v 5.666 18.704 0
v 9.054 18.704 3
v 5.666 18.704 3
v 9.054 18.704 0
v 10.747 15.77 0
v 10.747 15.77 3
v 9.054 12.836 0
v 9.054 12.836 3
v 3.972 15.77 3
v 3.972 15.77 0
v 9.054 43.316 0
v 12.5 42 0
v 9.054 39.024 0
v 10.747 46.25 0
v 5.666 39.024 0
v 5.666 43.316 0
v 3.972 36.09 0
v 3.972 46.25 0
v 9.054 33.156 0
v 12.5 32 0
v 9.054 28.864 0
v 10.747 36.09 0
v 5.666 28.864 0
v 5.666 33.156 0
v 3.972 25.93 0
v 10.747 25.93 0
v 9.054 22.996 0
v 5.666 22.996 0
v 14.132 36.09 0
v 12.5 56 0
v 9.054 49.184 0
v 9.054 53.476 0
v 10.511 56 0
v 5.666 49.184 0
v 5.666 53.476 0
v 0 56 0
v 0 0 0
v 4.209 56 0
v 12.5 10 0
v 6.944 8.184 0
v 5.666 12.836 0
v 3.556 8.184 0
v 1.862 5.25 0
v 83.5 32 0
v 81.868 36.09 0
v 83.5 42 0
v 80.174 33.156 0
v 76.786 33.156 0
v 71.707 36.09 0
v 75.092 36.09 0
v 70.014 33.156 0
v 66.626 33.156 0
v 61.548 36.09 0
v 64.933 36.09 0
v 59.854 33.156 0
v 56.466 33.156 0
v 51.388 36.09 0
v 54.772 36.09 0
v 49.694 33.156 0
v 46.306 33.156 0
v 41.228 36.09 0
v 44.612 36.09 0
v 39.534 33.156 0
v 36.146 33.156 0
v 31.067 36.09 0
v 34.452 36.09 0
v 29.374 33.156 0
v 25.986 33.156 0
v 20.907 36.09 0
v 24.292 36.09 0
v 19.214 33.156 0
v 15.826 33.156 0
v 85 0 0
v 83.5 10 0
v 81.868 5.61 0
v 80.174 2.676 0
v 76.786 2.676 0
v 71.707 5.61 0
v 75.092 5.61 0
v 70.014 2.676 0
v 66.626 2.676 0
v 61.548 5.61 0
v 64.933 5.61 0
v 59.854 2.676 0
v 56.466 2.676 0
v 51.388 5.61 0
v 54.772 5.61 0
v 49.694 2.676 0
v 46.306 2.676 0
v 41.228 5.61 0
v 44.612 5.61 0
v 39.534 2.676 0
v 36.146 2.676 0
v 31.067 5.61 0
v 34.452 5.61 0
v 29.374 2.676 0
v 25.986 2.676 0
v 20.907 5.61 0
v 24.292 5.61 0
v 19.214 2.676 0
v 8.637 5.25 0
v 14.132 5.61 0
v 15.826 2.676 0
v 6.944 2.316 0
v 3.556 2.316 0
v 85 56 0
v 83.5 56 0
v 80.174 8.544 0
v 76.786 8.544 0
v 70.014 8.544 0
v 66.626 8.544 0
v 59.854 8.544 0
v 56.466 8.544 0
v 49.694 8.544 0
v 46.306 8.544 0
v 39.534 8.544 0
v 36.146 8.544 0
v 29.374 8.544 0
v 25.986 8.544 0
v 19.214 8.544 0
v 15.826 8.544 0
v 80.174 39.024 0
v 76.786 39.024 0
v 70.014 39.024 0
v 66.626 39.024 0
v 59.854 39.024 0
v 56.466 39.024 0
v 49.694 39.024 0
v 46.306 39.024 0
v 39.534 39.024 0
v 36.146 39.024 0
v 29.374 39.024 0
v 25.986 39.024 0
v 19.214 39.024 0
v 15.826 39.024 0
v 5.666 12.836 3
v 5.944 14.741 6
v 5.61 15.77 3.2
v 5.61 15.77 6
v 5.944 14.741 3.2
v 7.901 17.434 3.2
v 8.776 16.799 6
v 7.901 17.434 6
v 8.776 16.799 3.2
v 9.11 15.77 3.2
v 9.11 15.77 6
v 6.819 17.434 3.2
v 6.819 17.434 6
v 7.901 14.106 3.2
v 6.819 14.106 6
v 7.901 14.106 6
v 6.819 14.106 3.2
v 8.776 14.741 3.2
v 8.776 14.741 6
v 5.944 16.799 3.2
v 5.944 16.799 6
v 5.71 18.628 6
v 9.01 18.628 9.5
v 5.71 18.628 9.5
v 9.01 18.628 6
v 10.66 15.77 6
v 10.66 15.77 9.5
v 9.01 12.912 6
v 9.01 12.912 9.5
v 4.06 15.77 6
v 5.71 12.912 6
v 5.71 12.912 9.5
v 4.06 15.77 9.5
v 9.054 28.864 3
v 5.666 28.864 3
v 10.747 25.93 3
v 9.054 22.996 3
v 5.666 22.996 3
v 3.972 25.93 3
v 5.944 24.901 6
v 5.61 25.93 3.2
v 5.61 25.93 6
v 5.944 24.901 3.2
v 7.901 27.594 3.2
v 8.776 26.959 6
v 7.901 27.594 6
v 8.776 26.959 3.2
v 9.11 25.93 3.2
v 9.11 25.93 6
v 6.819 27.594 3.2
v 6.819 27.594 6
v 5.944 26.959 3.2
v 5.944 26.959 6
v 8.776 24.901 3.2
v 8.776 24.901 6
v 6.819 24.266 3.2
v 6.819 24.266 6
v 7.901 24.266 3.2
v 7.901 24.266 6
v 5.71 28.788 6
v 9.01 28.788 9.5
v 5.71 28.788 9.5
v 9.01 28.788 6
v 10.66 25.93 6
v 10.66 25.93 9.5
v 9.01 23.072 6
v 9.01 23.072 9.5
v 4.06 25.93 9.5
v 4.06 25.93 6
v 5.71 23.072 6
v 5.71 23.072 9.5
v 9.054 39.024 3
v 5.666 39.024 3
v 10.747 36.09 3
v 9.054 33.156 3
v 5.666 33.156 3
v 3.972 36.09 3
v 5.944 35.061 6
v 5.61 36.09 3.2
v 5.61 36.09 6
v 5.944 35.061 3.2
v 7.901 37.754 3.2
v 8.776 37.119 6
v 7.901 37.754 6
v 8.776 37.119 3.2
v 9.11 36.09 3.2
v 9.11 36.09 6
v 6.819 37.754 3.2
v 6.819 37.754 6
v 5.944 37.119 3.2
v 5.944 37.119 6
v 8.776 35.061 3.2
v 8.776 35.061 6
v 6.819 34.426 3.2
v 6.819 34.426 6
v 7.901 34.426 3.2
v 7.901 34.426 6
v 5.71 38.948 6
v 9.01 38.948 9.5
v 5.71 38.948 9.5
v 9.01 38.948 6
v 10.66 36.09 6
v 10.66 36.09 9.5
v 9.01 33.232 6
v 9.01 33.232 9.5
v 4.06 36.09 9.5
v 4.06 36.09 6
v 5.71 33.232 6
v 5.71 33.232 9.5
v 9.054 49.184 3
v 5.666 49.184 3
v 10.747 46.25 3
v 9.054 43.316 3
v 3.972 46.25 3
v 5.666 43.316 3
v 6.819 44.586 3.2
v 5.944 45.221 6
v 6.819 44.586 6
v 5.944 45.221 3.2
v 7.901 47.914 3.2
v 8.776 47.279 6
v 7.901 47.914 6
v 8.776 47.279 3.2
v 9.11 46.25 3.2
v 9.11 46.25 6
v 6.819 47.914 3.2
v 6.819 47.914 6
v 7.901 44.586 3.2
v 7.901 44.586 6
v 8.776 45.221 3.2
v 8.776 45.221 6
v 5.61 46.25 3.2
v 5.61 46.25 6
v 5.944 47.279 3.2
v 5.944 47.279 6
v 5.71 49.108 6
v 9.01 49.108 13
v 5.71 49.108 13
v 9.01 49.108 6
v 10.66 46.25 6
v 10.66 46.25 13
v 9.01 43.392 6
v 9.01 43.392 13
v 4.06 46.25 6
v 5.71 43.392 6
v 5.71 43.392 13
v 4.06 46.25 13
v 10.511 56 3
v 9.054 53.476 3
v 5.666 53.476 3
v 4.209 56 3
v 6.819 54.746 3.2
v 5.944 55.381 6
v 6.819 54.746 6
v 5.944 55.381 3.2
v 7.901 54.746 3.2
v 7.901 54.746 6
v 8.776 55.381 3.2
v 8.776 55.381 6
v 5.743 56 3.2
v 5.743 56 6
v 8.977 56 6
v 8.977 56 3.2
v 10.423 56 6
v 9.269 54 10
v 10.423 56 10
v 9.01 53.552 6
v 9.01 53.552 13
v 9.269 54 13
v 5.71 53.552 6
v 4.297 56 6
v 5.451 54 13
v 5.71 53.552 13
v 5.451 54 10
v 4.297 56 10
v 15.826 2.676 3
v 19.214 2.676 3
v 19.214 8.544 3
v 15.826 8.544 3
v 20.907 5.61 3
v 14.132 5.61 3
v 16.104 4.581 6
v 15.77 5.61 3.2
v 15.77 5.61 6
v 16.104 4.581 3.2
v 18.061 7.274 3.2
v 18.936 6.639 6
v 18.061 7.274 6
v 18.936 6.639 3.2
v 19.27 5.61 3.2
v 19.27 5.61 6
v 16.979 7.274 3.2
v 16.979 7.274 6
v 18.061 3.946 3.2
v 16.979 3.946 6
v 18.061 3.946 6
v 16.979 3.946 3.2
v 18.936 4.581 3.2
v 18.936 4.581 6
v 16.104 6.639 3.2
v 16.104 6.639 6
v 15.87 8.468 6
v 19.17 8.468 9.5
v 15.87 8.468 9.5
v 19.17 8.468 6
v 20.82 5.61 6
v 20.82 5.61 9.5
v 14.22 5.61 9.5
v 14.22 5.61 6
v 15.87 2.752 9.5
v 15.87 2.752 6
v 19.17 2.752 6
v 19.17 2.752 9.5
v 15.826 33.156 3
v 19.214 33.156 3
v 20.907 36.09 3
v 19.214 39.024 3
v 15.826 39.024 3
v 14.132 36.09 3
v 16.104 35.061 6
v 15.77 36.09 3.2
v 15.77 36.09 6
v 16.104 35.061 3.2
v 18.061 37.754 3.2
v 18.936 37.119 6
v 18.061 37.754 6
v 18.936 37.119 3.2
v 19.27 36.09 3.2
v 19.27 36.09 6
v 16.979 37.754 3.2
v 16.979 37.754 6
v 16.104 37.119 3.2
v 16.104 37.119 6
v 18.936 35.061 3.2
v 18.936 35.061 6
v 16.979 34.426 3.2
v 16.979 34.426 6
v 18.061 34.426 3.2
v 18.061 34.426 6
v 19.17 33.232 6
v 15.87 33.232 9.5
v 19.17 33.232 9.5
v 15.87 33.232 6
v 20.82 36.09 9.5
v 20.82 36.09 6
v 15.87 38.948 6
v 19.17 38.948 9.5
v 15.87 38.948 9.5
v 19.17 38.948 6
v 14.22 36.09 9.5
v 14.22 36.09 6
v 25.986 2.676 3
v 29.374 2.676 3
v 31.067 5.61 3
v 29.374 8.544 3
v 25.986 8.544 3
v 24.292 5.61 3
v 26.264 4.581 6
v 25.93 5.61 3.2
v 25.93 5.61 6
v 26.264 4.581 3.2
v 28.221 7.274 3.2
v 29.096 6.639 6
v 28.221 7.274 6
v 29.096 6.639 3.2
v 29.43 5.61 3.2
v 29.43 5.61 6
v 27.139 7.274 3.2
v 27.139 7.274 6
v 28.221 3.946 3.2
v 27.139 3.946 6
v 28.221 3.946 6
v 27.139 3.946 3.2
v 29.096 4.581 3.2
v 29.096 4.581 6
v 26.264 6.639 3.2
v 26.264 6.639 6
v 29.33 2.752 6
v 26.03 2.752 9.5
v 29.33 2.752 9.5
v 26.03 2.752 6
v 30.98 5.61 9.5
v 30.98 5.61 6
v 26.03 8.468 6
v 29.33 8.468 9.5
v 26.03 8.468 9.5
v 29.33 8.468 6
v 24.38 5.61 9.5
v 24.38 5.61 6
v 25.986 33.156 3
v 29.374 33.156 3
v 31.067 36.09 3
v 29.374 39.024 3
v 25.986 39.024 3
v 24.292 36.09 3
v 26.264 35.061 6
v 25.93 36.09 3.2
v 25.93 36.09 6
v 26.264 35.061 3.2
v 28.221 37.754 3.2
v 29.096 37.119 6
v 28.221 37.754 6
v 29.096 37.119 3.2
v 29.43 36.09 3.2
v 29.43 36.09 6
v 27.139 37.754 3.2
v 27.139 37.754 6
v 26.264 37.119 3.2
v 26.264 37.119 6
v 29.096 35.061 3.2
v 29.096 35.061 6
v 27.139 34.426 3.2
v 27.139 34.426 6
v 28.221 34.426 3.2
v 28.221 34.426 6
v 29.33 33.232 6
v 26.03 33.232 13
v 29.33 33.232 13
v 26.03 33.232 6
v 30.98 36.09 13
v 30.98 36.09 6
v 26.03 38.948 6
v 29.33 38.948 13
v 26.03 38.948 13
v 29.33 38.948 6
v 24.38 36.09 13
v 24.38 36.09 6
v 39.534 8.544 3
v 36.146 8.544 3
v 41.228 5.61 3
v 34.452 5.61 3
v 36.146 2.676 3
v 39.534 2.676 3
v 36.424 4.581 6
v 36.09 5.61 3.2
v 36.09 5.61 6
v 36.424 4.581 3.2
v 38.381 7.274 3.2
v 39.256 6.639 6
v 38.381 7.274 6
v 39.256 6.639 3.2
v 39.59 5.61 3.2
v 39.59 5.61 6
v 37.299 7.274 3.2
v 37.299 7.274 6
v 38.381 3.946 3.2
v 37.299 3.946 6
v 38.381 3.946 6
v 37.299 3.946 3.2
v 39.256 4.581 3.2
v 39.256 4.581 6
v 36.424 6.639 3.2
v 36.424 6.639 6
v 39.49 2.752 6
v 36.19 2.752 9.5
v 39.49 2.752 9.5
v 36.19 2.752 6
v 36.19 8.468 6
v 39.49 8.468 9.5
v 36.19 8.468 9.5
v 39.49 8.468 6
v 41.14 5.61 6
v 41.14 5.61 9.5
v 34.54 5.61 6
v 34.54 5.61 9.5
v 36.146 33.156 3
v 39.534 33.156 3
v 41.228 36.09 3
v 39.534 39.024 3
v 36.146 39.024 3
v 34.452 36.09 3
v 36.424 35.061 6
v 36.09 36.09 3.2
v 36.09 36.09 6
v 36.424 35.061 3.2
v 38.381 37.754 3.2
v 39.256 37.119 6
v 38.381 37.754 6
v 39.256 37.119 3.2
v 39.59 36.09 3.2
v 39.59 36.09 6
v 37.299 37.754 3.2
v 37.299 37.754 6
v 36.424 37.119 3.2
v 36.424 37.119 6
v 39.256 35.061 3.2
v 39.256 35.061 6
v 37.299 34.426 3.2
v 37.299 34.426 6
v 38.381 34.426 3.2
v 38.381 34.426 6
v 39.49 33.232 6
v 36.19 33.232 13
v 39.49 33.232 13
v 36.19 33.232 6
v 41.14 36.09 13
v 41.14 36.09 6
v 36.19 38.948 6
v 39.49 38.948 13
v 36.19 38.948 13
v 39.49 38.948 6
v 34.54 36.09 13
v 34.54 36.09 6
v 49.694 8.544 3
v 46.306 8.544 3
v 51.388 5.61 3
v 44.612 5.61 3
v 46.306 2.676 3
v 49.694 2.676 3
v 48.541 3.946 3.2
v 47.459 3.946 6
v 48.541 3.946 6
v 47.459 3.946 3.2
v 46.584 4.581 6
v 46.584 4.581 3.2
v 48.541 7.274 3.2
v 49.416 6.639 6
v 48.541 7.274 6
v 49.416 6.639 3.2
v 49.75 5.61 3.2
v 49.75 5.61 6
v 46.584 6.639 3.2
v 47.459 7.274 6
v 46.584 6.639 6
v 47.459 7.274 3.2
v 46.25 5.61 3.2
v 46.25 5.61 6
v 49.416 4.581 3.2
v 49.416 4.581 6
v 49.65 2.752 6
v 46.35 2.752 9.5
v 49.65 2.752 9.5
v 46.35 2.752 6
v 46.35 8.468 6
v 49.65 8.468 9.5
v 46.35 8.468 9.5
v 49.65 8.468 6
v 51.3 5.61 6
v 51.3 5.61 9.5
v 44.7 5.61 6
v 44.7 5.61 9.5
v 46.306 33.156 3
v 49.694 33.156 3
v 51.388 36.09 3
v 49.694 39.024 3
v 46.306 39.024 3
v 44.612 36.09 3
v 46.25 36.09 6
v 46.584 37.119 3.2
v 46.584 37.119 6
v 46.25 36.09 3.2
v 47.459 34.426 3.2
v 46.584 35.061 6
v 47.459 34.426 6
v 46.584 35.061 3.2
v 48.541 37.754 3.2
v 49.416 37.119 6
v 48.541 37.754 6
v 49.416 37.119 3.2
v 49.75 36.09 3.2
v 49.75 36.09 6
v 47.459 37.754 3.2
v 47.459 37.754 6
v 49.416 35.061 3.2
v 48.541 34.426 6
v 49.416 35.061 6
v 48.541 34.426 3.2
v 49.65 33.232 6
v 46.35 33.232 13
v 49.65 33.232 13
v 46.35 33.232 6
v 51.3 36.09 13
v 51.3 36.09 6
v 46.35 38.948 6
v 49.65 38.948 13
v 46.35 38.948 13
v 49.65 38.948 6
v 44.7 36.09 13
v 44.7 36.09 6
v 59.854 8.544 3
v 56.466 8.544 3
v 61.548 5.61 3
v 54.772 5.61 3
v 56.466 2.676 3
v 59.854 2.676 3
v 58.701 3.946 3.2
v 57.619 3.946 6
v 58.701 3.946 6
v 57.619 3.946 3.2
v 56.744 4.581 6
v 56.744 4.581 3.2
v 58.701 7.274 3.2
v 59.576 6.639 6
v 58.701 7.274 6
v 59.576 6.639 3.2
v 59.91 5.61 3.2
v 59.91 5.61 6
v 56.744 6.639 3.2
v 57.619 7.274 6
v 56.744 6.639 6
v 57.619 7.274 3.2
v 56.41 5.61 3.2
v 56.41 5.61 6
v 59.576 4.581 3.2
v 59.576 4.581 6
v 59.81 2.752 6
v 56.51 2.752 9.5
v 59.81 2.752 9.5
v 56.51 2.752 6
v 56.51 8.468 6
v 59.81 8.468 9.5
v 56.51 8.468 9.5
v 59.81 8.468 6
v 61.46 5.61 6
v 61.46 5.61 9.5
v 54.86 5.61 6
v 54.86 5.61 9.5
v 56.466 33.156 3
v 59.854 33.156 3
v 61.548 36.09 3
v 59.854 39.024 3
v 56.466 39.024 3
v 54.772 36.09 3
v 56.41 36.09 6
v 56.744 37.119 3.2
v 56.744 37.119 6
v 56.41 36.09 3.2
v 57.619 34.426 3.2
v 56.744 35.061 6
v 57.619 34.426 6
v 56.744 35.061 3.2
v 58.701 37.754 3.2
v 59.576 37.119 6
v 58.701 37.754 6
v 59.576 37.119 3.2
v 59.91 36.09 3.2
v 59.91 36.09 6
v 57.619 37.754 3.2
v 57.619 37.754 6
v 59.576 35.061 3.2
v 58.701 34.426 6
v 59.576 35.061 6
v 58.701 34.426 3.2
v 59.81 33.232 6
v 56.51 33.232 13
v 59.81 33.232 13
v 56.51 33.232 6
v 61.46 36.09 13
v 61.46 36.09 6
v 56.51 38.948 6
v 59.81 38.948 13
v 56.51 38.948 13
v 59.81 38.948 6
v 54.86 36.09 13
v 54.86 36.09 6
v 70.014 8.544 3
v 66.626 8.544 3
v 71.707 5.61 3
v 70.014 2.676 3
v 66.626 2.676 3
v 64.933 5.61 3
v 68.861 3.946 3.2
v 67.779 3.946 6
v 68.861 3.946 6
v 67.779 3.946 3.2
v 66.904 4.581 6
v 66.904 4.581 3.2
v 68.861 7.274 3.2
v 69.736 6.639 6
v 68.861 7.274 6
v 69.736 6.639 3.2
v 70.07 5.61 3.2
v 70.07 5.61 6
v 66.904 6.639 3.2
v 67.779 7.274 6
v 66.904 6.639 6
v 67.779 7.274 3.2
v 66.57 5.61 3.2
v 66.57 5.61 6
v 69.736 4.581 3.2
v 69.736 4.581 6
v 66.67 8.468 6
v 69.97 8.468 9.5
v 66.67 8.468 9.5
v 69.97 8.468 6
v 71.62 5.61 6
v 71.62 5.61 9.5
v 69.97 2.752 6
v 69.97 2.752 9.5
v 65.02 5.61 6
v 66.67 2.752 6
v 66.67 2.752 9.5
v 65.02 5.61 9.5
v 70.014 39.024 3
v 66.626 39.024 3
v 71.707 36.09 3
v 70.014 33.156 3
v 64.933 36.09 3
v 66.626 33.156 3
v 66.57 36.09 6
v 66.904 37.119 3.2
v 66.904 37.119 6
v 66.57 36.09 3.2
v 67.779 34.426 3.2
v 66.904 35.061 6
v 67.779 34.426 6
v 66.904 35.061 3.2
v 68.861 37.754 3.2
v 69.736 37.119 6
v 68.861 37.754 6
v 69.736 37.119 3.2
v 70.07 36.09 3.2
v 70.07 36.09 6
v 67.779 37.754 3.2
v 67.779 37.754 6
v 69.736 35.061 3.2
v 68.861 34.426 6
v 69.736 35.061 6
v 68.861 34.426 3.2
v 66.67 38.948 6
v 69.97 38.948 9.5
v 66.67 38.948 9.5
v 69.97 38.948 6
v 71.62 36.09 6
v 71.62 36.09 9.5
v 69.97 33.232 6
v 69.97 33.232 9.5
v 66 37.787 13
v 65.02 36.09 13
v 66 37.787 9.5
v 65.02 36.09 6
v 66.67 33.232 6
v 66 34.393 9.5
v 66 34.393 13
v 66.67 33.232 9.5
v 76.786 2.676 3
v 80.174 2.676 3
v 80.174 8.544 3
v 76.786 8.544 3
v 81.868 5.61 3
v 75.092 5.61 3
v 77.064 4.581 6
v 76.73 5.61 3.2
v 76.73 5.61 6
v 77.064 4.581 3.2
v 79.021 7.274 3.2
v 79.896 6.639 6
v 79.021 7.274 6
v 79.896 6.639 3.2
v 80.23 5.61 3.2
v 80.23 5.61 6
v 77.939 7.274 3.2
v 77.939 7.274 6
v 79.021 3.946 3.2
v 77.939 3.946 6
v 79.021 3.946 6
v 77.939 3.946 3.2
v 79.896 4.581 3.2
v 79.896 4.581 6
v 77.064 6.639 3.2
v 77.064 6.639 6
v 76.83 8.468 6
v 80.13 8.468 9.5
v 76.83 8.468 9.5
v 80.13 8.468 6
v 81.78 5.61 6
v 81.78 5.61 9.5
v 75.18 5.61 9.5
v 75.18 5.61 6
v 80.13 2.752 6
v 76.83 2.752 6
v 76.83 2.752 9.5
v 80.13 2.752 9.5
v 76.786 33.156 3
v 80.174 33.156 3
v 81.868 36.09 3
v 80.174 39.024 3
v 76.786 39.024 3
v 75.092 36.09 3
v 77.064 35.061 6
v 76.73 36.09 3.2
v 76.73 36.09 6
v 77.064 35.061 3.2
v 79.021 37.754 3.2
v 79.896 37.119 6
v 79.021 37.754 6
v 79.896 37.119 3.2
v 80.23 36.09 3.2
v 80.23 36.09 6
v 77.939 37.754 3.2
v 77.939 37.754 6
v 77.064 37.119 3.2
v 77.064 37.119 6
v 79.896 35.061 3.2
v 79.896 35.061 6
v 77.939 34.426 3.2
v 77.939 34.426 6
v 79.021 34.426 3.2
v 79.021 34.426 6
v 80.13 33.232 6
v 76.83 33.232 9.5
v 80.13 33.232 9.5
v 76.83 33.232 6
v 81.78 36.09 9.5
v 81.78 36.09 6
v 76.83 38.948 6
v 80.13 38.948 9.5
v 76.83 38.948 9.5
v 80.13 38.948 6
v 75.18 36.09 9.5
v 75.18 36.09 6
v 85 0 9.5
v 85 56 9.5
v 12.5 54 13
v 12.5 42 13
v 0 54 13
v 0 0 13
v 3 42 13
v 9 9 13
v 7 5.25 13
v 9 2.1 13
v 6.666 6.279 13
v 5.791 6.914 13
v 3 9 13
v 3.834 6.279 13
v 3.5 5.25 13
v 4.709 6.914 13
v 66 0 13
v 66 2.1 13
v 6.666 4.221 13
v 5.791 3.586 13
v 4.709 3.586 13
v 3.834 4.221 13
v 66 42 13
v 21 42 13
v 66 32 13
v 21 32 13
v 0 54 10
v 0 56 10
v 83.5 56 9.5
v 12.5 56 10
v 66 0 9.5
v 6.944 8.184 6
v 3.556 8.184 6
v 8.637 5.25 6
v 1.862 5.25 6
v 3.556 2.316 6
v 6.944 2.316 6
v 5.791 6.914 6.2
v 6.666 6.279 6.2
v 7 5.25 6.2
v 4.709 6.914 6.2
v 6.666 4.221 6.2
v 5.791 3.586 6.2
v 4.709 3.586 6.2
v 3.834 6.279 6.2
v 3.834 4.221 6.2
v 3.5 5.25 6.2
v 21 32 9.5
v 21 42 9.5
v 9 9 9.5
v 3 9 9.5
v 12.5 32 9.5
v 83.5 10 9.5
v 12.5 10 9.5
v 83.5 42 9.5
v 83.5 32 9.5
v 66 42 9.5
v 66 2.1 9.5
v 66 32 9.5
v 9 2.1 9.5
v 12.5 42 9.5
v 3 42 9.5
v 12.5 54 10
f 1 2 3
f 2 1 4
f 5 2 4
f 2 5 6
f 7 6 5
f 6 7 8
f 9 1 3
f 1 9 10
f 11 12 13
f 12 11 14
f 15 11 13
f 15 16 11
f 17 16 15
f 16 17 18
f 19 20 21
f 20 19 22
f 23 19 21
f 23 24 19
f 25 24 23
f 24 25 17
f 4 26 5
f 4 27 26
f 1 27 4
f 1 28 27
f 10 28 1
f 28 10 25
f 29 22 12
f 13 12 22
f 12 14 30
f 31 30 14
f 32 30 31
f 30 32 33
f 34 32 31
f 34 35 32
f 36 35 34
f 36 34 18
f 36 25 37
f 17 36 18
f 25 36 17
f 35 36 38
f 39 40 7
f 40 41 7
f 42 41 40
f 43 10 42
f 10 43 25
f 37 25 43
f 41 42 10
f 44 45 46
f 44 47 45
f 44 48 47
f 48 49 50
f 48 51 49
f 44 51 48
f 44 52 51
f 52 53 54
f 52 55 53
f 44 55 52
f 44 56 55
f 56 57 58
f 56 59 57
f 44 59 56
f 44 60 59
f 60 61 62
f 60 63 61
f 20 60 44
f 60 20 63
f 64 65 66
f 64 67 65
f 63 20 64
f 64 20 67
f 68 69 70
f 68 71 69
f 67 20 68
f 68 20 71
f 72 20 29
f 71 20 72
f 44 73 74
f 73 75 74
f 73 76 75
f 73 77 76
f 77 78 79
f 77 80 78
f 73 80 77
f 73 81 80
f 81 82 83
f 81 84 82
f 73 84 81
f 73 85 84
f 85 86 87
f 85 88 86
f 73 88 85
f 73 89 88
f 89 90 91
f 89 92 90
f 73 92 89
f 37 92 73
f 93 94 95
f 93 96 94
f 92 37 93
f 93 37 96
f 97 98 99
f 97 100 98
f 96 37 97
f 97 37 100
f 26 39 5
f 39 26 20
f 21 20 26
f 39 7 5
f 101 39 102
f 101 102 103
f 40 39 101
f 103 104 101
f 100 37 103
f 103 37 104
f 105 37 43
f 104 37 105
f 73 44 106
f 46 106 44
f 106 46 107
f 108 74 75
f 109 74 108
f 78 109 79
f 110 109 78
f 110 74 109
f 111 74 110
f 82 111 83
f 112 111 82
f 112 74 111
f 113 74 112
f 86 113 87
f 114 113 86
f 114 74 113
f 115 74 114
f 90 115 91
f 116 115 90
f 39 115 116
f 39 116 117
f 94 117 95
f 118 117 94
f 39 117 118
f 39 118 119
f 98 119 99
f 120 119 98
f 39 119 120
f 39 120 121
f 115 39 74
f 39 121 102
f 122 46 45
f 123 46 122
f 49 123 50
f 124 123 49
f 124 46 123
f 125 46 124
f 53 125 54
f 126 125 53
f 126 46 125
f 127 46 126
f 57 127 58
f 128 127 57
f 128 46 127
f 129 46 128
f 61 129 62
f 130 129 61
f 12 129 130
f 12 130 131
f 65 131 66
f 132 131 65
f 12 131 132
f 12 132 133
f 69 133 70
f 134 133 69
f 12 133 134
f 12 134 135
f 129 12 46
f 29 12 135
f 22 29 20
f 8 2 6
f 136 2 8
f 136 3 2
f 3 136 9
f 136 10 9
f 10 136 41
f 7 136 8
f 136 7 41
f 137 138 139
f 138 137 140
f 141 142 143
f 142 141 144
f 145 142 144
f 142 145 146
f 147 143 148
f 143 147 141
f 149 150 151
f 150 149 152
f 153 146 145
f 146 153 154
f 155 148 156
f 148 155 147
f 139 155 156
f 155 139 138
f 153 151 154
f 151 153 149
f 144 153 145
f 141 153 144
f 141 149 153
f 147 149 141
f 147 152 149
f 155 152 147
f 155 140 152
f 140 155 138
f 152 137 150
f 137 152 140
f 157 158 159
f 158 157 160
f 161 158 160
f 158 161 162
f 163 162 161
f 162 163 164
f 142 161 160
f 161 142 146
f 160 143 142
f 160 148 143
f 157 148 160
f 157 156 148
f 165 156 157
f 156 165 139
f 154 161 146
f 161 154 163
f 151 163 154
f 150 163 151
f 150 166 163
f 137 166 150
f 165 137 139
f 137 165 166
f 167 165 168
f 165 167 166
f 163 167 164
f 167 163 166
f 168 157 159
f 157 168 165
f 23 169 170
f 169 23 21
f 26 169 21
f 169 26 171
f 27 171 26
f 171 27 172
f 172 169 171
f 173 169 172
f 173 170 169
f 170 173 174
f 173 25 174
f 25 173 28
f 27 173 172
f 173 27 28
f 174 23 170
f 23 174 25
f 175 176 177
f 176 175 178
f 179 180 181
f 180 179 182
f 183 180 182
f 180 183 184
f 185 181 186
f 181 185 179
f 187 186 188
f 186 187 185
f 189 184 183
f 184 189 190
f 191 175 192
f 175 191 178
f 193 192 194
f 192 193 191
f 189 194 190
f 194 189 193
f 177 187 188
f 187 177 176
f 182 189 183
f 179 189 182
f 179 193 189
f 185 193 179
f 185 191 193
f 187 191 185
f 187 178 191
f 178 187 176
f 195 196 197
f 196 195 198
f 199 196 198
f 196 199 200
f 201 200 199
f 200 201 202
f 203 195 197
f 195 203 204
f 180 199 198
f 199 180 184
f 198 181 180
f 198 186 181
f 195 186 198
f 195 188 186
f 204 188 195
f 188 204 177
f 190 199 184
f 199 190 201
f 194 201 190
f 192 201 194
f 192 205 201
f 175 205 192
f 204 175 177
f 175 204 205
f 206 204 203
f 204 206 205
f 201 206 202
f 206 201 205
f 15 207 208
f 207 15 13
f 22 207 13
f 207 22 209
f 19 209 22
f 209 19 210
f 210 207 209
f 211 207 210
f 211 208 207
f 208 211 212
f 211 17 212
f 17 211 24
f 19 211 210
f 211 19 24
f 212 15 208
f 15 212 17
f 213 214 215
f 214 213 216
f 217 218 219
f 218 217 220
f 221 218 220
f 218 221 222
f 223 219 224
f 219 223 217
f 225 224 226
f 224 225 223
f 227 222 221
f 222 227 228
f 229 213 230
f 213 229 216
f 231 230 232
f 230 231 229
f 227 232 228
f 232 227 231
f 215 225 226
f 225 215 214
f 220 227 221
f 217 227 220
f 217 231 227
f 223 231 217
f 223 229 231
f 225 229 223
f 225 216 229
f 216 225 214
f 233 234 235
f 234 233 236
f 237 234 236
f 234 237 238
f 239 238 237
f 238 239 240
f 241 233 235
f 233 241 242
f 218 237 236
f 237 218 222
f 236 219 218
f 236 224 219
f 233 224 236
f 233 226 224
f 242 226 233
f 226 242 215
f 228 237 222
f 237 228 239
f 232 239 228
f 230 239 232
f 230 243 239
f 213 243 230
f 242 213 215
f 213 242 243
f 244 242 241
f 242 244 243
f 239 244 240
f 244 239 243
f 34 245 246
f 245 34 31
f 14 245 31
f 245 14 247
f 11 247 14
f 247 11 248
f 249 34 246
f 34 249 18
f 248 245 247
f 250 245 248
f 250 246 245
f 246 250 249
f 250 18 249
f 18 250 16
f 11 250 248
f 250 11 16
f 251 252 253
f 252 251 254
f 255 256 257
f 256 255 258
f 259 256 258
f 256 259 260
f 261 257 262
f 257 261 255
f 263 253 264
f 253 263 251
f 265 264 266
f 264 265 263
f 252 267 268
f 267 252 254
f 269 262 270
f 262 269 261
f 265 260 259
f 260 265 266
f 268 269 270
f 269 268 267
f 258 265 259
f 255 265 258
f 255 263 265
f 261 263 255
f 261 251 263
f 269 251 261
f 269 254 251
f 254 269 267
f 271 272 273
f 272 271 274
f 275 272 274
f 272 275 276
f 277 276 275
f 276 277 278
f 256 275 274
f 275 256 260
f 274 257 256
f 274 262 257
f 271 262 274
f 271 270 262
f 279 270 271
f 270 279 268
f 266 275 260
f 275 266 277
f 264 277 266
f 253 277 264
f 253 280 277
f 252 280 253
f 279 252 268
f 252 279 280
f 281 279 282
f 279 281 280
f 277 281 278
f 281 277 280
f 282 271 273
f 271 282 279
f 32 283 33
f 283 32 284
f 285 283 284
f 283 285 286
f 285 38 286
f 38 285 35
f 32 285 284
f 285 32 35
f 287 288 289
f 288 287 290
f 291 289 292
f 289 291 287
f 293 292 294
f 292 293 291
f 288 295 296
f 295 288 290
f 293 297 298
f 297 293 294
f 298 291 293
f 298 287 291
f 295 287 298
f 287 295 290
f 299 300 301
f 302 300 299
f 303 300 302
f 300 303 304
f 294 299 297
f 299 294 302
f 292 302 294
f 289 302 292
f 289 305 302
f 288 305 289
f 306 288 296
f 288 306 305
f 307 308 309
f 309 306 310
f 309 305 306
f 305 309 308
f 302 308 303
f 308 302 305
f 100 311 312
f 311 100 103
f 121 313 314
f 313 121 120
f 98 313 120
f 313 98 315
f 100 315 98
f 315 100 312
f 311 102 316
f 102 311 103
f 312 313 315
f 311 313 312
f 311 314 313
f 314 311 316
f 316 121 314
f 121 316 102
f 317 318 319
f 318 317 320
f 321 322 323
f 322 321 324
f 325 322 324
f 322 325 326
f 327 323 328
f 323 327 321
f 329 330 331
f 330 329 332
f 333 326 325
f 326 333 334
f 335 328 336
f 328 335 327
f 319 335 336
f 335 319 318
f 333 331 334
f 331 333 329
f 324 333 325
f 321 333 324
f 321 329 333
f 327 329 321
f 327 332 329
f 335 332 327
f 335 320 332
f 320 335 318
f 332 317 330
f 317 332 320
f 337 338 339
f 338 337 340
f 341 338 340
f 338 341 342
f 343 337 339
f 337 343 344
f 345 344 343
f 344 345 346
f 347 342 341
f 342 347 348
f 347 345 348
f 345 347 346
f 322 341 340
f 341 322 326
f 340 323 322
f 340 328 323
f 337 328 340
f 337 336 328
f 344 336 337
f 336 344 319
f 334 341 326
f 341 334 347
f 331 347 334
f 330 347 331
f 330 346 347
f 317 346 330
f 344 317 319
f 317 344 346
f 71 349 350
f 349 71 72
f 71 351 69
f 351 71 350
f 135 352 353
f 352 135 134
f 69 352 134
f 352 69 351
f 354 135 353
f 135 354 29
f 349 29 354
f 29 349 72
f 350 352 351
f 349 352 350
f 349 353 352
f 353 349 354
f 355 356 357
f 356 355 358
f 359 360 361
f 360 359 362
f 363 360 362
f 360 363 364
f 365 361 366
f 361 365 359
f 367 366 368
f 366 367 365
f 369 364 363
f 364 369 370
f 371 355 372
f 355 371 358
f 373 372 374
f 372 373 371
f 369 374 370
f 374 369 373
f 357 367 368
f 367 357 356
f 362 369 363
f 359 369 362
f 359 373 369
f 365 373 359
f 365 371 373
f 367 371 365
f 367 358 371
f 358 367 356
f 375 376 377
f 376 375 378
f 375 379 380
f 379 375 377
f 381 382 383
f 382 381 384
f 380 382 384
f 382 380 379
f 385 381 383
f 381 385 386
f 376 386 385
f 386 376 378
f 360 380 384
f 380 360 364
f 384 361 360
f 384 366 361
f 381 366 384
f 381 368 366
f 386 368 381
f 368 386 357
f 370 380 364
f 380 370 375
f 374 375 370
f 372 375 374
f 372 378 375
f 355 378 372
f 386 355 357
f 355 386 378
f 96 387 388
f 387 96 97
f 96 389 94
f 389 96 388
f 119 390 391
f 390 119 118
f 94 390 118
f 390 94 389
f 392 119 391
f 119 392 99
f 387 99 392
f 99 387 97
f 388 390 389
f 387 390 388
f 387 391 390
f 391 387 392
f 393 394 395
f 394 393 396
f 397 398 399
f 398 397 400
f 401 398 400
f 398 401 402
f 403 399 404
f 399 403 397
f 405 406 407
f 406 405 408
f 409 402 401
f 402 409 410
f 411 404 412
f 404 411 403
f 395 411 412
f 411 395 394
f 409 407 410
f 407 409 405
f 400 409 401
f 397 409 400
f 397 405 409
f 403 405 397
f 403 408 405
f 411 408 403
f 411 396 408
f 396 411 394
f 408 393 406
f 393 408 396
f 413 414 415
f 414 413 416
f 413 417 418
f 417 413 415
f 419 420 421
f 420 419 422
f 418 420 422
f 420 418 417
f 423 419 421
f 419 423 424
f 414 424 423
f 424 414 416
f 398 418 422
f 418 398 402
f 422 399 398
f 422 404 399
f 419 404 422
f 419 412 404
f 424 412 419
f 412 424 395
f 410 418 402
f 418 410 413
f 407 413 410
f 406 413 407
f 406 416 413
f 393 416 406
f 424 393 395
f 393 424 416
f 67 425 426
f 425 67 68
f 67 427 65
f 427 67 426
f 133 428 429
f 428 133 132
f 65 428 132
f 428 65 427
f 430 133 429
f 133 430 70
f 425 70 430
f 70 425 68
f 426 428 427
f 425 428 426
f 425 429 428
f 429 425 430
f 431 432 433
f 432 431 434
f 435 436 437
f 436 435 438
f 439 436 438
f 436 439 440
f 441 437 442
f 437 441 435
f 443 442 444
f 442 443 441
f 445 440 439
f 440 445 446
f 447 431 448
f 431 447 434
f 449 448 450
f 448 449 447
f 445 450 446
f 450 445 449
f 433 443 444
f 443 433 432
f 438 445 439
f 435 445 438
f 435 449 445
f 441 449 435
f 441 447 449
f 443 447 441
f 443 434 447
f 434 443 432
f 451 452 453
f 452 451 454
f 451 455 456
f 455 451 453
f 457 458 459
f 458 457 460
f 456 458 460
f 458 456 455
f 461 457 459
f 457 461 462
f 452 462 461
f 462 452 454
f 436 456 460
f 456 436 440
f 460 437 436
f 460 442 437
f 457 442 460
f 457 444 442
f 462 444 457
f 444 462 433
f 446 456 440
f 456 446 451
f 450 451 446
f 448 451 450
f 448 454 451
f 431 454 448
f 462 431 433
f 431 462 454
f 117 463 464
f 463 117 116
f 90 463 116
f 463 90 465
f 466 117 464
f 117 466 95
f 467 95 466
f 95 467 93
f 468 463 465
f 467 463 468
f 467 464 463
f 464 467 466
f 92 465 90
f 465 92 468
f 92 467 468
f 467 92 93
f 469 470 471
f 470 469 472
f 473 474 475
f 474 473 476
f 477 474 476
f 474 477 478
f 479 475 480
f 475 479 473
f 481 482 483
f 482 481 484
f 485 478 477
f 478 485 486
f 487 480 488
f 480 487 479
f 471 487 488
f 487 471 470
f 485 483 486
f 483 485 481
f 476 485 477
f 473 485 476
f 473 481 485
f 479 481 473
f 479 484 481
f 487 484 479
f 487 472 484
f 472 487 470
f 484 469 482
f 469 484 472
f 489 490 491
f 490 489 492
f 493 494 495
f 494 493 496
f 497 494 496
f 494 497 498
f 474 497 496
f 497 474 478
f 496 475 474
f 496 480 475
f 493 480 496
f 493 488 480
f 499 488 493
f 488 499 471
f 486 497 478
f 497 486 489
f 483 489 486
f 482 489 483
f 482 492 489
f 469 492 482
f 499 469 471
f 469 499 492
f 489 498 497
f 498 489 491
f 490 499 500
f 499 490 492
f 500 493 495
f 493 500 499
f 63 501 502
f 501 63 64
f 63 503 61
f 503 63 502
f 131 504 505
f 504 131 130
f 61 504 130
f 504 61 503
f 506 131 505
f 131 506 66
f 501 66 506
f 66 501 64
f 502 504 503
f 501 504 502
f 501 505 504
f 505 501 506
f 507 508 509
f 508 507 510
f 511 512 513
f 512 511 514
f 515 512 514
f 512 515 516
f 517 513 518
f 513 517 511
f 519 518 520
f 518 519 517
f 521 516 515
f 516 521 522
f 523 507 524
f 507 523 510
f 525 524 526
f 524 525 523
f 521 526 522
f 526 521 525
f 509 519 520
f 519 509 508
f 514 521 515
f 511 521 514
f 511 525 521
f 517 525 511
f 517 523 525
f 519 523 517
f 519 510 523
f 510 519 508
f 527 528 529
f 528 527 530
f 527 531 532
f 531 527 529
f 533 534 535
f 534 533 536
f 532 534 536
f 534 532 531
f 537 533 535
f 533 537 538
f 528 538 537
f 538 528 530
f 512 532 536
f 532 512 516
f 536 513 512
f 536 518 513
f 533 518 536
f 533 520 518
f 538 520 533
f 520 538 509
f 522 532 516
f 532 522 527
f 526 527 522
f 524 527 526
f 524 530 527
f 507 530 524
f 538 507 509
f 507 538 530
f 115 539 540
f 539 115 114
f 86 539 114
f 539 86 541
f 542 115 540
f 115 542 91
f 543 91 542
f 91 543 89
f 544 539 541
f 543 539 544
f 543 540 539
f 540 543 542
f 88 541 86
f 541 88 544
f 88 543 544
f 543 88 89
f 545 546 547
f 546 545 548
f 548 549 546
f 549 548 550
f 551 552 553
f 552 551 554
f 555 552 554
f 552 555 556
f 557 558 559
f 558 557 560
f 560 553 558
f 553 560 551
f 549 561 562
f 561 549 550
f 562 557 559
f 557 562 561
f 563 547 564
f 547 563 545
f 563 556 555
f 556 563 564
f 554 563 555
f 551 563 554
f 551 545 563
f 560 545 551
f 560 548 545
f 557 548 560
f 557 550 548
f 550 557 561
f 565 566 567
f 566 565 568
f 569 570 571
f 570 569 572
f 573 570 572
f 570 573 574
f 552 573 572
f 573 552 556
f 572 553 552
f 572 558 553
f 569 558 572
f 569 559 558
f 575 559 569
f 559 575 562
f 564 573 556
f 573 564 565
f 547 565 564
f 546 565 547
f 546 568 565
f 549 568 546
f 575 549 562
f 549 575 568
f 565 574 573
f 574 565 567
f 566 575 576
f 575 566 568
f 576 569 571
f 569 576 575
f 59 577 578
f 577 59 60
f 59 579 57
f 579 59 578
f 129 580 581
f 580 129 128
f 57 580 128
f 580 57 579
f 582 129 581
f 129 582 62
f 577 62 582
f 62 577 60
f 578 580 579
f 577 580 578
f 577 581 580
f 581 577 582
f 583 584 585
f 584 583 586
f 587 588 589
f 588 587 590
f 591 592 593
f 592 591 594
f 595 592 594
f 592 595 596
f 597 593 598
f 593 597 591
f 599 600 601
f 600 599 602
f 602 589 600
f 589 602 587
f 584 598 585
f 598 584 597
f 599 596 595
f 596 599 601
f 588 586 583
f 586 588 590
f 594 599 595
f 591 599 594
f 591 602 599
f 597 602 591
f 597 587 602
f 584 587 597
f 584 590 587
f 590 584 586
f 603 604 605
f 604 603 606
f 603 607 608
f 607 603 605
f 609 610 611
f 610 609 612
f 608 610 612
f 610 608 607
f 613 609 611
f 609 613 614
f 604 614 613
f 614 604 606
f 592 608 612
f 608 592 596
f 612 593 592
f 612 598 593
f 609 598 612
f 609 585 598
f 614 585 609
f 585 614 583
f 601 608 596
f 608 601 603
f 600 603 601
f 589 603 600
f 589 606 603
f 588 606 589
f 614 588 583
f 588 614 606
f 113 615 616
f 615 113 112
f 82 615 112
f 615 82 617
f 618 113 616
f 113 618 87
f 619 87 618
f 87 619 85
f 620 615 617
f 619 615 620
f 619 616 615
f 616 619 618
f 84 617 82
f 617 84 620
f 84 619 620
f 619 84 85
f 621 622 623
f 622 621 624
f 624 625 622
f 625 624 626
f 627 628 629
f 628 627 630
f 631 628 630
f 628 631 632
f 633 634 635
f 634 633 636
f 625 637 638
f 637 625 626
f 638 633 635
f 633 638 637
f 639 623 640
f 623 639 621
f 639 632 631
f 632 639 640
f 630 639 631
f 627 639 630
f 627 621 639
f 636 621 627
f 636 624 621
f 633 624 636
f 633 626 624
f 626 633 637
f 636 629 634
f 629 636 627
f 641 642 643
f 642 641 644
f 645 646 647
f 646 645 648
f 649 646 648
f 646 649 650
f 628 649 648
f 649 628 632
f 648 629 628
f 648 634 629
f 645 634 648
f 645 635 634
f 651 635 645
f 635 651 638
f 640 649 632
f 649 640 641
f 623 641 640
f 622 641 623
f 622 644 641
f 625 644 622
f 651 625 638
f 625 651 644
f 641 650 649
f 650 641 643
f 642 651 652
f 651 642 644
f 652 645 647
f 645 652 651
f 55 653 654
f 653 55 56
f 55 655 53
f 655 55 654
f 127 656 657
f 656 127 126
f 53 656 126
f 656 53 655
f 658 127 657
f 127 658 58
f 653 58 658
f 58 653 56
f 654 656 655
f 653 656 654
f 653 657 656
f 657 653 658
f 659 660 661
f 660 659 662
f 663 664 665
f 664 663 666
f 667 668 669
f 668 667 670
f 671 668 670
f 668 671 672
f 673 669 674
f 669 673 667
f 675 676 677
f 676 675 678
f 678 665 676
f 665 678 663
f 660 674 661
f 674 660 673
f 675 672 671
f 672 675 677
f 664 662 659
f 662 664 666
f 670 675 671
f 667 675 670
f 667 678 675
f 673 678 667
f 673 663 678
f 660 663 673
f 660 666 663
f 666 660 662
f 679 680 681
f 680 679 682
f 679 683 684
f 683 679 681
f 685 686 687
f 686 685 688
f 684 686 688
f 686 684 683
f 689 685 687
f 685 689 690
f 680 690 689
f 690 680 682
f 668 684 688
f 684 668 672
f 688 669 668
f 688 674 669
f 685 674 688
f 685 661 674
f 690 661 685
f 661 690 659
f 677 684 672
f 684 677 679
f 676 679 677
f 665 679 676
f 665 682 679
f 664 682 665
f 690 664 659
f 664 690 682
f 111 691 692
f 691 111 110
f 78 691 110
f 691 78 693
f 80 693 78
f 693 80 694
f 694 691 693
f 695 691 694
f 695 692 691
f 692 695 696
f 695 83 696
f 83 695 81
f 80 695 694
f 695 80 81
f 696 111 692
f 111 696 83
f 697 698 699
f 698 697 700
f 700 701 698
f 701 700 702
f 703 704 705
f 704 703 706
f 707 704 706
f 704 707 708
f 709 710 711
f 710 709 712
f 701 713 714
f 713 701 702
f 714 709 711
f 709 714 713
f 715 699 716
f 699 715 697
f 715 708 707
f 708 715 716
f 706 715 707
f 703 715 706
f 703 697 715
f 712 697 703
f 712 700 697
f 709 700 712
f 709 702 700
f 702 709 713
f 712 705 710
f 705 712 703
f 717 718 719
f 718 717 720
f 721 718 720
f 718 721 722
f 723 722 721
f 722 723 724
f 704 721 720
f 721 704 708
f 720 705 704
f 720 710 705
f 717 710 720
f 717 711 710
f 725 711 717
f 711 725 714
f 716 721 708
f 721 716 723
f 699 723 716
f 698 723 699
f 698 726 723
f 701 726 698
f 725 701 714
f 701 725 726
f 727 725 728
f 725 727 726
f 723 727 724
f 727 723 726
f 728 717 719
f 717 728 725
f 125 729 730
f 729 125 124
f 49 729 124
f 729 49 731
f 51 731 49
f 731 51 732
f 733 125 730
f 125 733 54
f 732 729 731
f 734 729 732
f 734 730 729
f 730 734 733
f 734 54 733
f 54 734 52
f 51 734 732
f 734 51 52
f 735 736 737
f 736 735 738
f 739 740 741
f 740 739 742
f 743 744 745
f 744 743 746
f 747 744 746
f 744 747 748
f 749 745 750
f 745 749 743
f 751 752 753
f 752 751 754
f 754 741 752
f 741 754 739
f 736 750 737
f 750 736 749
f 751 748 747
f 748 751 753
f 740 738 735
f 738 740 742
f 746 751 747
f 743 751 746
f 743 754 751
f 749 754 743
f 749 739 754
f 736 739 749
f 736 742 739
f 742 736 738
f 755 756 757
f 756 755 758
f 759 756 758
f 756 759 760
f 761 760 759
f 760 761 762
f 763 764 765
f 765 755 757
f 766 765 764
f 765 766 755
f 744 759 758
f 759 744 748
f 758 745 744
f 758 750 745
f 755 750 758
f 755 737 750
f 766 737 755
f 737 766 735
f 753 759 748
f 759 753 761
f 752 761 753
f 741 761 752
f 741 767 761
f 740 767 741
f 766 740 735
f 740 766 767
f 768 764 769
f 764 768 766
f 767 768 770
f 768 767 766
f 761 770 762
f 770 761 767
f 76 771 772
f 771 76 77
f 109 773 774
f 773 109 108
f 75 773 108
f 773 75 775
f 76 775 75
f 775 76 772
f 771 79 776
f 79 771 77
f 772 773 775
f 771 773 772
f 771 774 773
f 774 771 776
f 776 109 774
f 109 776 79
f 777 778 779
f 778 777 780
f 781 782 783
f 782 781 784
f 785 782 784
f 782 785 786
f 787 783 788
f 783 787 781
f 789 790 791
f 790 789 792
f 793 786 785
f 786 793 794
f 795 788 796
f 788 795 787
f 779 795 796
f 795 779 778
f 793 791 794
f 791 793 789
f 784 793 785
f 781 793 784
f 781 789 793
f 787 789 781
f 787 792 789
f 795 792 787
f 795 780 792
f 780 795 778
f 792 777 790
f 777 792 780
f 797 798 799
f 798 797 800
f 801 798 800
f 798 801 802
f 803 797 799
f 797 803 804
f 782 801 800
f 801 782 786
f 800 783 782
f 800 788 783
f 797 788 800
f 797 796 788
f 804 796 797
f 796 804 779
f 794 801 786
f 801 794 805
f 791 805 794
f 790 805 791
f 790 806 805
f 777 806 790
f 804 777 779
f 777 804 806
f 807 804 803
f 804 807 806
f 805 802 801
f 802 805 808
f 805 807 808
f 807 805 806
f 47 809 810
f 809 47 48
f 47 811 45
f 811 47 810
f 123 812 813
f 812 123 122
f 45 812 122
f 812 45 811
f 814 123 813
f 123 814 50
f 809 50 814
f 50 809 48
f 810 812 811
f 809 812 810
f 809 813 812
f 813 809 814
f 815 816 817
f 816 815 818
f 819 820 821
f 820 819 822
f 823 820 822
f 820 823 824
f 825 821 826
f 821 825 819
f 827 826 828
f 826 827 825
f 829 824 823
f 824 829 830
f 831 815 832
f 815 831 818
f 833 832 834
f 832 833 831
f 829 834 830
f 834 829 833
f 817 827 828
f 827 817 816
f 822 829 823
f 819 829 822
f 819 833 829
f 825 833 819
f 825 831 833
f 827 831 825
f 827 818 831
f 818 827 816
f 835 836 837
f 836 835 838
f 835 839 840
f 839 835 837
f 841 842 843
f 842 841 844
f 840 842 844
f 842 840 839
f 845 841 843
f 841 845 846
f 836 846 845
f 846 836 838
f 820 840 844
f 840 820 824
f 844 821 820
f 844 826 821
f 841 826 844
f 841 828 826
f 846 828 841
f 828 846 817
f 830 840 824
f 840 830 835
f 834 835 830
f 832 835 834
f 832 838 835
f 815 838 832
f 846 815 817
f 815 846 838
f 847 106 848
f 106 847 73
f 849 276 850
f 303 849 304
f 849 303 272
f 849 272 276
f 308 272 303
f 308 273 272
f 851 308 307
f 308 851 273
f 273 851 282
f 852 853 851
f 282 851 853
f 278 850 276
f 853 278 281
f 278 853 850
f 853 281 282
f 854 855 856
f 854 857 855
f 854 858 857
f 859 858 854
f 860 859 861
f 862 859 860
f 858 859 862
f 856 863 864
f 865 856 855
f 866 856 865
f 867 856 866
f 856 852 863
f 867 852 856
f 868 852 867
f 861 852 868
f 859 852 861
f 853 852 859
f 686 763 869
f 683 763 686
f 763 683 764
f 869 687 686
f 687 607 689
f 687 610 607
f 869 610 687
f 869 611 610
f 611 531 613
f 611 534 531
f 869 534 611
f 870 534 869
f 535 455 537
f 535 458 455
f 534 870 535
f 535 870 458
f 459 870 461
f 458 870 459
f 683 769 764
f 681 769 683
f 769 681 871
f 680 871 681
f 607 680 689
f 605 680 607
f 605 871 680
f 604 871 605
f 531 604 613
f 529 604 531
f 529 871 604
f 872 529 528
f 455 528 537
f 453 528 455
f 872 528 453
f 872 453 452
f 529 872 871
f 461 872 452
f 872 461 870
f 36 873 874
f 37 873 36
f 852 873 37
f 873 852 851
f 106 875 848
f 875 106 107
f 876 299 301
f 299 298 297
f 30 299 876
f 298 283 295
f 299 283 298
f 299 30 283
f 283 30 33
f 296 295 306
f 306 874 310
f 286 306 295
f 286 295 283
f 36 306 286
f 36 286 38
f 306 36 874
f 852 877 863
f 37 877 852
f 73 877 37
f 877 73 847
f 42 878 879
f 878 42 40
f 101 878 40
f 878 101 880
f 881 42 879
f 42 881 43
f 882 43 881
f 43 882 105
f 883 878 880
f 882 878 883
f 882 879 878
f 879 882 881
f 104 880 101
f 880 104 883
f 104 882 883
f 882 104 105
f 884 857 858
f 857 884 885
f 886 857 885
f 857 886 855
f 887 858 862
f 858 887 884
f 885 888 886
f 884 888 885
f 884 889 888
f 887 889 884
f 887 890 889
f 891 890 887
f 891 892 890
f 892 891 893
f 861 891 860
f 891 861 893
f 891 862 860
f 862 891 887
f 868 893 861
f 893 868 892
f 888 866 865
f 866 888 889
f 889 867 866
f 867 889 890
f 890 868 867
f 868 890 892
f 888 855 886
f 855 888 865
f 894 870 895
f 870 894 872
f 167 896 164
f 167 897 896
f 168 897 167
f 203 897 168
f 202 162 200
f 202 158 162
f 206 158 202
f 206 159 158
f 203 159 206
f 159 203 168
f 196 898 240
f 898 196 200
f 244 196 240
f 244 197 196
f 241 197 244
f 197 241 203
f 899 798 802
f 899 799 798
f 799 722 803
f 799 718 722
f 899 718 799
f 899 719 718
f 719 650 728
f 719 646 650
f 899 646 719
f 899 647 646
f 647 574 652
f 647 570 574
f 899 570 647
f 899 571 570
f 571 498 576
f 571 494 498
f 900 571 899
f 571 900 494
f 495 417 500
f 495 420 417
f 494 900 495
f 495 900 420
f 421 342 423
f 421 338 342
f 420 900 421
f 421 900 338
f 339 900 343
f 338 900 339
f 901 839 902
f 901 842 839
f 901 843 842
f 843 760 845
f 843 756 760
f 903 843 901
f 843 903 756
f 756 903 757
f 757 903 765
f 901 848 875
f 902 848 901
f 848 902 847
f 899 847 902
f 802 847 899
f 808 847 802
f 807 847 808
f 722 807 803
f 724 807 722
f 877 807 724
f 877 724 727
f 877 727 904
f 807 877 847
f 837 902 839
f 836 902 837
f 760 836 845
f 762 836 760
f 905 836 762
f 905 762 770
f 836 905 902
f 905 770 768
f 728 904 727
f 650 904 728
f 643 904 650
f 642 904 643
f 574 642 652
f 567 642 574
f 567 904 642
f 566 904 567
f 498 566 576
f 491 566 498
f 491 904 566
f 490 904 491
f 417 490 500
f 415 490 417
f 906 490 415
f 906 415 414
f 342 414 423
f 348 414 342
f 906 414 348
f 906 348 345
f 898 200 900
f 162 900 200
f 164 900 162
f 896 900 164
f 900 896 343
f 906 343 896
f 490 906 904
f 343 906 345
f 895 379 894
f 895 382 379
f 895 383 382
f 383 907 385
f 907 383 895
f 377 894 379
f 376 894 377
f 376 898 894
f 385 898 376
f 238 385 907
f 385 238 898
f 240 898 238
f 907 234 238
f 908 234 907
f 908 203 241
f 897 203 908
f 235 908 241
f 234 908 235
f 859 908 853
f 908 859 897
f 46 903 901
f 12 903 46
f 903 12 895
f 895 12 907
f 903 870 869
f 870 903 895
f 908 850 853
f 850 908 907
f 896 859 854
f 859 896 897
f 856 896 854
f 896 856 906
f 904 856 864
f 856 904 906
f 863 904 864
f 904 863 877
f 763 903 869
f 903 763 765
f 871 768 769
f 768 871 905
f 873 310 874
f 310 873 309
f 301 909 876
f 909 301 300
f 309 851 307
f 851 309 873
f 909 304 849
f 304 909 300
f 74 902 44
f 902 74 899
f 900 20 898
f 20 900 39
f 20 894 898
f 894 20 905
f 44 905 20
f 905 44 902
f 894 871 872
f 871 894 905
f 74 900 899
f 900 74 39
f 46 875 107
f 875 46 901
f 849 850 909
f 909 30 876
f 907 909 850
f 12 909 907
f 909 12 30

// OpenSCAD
pedestal_height = 13;   // designed for use the MLAB standard 12mm screws.
mount_hole = 3.5;
clear = 0.175;
nut_size = 6.6;

MLAB_grid_xoffset = 7.36;
MLAB_grid_yoffset = 5.61;
MLAB_grid = 10.16;

ODROID_holes_offset = 5.25;
ODROID_holes_xdistance = 86;
ODROID_holes_ydistance = 82;

difference () {
	cube([85,56,pedestal_height]);          // base plastics brick

	//mount holes for Raspberry Pi model A/B 

        translate ([ODROID_holes_offset, ODROID_holes_offset,0])
        cylinder (h = 6, r= (nut_size+clear)/2, $fn=6);
        translate ([ODROID_holes_offset, ODROID_holes_offset, 6.2])  // one solid layer for slicer (the holes will be pierced on demand )
        cylinder (h = pedestal_height, r= mount_hole/2, $fn=10);

        translate ([ODROID_holes_offset + ODROID_holes_xdistance, ODROID_holes_offset, 0])
        cylinder (h = 6, r= (nut_size+clear)/2, $fn=6);
        translate ([ODROID_holes_offset + ODROID_holes_xdistance, ODROID_holes_offset, 6.2])  // one solid layer for slicer (the holes will be pierced on demand )
        cylinder (h = pedestal_height, r= mount_hole/2, $fn=10);


/////////////////////////////////////////
//      holes for components at the bottom side of the PCB.

	translate ([15.5, 84 , pedestal_height - 3]) // IO connector
	cube([64, 6, 5]);
        
        translate ([3, 9, pedestal_height - 3.5])  // USB connector
	cube([18,33,5]);


        translate ([9, 2.1 , pedestal_height - 3.5]) // HOLE for ODROD's USB and Ethernet connectors
	cube([73,27,5]);

	translate ([66, 0 , pedestal_height - 3.5]) // HOLE for ODROD's Passive components and power wires to MLAB UNIPOWER module. 
	cube([20,79,5]);

	translate ([0, 54 , pedestal_height - 3]) // Jack connectors
	cube([30,28,5]);


	translate ([22, 43 , pedestal_height - 3.5]) // eMMc Card 
	cube([27,18,5]);

        ////////////////////////////////////////

// MLAB grid holes
        grid_list = [for (j = [MLAB_grid_xoffset : MLAB_grid: 90], i = [MLAB_grid_yoffset :MLAB_grid: 95]) if (!(j>80 && i>80) && !(j<10 && i<10) && !(j<10 && i>80) && !(j>80 && i<10) ) [j, i] ];
        for (j = grid_list) {
                translate (concat(j, [0]))
                cylinder (h = 3, r= (nut_size+clear)/2, $fn=6);
                translate (concat(j, [3.2]))  // one solid layer for slicer (the holes will be pierced on demand )
                cylinder (h = pedestal_height /3, r= mount_hole/2, $fn=10);
                translate (concat(j, [6.0]))
                cylinder (h = 10, r= nut_size/2, $fn=6);
        }
        
        
////  lightening central holes
        
	translate ([12.5,10, 0])  
	cube([71,22,pedestal_height ]);        
        
	translate ([12.5,42, 0])  
	cube([71,40,pedestal_height ]);        

}
